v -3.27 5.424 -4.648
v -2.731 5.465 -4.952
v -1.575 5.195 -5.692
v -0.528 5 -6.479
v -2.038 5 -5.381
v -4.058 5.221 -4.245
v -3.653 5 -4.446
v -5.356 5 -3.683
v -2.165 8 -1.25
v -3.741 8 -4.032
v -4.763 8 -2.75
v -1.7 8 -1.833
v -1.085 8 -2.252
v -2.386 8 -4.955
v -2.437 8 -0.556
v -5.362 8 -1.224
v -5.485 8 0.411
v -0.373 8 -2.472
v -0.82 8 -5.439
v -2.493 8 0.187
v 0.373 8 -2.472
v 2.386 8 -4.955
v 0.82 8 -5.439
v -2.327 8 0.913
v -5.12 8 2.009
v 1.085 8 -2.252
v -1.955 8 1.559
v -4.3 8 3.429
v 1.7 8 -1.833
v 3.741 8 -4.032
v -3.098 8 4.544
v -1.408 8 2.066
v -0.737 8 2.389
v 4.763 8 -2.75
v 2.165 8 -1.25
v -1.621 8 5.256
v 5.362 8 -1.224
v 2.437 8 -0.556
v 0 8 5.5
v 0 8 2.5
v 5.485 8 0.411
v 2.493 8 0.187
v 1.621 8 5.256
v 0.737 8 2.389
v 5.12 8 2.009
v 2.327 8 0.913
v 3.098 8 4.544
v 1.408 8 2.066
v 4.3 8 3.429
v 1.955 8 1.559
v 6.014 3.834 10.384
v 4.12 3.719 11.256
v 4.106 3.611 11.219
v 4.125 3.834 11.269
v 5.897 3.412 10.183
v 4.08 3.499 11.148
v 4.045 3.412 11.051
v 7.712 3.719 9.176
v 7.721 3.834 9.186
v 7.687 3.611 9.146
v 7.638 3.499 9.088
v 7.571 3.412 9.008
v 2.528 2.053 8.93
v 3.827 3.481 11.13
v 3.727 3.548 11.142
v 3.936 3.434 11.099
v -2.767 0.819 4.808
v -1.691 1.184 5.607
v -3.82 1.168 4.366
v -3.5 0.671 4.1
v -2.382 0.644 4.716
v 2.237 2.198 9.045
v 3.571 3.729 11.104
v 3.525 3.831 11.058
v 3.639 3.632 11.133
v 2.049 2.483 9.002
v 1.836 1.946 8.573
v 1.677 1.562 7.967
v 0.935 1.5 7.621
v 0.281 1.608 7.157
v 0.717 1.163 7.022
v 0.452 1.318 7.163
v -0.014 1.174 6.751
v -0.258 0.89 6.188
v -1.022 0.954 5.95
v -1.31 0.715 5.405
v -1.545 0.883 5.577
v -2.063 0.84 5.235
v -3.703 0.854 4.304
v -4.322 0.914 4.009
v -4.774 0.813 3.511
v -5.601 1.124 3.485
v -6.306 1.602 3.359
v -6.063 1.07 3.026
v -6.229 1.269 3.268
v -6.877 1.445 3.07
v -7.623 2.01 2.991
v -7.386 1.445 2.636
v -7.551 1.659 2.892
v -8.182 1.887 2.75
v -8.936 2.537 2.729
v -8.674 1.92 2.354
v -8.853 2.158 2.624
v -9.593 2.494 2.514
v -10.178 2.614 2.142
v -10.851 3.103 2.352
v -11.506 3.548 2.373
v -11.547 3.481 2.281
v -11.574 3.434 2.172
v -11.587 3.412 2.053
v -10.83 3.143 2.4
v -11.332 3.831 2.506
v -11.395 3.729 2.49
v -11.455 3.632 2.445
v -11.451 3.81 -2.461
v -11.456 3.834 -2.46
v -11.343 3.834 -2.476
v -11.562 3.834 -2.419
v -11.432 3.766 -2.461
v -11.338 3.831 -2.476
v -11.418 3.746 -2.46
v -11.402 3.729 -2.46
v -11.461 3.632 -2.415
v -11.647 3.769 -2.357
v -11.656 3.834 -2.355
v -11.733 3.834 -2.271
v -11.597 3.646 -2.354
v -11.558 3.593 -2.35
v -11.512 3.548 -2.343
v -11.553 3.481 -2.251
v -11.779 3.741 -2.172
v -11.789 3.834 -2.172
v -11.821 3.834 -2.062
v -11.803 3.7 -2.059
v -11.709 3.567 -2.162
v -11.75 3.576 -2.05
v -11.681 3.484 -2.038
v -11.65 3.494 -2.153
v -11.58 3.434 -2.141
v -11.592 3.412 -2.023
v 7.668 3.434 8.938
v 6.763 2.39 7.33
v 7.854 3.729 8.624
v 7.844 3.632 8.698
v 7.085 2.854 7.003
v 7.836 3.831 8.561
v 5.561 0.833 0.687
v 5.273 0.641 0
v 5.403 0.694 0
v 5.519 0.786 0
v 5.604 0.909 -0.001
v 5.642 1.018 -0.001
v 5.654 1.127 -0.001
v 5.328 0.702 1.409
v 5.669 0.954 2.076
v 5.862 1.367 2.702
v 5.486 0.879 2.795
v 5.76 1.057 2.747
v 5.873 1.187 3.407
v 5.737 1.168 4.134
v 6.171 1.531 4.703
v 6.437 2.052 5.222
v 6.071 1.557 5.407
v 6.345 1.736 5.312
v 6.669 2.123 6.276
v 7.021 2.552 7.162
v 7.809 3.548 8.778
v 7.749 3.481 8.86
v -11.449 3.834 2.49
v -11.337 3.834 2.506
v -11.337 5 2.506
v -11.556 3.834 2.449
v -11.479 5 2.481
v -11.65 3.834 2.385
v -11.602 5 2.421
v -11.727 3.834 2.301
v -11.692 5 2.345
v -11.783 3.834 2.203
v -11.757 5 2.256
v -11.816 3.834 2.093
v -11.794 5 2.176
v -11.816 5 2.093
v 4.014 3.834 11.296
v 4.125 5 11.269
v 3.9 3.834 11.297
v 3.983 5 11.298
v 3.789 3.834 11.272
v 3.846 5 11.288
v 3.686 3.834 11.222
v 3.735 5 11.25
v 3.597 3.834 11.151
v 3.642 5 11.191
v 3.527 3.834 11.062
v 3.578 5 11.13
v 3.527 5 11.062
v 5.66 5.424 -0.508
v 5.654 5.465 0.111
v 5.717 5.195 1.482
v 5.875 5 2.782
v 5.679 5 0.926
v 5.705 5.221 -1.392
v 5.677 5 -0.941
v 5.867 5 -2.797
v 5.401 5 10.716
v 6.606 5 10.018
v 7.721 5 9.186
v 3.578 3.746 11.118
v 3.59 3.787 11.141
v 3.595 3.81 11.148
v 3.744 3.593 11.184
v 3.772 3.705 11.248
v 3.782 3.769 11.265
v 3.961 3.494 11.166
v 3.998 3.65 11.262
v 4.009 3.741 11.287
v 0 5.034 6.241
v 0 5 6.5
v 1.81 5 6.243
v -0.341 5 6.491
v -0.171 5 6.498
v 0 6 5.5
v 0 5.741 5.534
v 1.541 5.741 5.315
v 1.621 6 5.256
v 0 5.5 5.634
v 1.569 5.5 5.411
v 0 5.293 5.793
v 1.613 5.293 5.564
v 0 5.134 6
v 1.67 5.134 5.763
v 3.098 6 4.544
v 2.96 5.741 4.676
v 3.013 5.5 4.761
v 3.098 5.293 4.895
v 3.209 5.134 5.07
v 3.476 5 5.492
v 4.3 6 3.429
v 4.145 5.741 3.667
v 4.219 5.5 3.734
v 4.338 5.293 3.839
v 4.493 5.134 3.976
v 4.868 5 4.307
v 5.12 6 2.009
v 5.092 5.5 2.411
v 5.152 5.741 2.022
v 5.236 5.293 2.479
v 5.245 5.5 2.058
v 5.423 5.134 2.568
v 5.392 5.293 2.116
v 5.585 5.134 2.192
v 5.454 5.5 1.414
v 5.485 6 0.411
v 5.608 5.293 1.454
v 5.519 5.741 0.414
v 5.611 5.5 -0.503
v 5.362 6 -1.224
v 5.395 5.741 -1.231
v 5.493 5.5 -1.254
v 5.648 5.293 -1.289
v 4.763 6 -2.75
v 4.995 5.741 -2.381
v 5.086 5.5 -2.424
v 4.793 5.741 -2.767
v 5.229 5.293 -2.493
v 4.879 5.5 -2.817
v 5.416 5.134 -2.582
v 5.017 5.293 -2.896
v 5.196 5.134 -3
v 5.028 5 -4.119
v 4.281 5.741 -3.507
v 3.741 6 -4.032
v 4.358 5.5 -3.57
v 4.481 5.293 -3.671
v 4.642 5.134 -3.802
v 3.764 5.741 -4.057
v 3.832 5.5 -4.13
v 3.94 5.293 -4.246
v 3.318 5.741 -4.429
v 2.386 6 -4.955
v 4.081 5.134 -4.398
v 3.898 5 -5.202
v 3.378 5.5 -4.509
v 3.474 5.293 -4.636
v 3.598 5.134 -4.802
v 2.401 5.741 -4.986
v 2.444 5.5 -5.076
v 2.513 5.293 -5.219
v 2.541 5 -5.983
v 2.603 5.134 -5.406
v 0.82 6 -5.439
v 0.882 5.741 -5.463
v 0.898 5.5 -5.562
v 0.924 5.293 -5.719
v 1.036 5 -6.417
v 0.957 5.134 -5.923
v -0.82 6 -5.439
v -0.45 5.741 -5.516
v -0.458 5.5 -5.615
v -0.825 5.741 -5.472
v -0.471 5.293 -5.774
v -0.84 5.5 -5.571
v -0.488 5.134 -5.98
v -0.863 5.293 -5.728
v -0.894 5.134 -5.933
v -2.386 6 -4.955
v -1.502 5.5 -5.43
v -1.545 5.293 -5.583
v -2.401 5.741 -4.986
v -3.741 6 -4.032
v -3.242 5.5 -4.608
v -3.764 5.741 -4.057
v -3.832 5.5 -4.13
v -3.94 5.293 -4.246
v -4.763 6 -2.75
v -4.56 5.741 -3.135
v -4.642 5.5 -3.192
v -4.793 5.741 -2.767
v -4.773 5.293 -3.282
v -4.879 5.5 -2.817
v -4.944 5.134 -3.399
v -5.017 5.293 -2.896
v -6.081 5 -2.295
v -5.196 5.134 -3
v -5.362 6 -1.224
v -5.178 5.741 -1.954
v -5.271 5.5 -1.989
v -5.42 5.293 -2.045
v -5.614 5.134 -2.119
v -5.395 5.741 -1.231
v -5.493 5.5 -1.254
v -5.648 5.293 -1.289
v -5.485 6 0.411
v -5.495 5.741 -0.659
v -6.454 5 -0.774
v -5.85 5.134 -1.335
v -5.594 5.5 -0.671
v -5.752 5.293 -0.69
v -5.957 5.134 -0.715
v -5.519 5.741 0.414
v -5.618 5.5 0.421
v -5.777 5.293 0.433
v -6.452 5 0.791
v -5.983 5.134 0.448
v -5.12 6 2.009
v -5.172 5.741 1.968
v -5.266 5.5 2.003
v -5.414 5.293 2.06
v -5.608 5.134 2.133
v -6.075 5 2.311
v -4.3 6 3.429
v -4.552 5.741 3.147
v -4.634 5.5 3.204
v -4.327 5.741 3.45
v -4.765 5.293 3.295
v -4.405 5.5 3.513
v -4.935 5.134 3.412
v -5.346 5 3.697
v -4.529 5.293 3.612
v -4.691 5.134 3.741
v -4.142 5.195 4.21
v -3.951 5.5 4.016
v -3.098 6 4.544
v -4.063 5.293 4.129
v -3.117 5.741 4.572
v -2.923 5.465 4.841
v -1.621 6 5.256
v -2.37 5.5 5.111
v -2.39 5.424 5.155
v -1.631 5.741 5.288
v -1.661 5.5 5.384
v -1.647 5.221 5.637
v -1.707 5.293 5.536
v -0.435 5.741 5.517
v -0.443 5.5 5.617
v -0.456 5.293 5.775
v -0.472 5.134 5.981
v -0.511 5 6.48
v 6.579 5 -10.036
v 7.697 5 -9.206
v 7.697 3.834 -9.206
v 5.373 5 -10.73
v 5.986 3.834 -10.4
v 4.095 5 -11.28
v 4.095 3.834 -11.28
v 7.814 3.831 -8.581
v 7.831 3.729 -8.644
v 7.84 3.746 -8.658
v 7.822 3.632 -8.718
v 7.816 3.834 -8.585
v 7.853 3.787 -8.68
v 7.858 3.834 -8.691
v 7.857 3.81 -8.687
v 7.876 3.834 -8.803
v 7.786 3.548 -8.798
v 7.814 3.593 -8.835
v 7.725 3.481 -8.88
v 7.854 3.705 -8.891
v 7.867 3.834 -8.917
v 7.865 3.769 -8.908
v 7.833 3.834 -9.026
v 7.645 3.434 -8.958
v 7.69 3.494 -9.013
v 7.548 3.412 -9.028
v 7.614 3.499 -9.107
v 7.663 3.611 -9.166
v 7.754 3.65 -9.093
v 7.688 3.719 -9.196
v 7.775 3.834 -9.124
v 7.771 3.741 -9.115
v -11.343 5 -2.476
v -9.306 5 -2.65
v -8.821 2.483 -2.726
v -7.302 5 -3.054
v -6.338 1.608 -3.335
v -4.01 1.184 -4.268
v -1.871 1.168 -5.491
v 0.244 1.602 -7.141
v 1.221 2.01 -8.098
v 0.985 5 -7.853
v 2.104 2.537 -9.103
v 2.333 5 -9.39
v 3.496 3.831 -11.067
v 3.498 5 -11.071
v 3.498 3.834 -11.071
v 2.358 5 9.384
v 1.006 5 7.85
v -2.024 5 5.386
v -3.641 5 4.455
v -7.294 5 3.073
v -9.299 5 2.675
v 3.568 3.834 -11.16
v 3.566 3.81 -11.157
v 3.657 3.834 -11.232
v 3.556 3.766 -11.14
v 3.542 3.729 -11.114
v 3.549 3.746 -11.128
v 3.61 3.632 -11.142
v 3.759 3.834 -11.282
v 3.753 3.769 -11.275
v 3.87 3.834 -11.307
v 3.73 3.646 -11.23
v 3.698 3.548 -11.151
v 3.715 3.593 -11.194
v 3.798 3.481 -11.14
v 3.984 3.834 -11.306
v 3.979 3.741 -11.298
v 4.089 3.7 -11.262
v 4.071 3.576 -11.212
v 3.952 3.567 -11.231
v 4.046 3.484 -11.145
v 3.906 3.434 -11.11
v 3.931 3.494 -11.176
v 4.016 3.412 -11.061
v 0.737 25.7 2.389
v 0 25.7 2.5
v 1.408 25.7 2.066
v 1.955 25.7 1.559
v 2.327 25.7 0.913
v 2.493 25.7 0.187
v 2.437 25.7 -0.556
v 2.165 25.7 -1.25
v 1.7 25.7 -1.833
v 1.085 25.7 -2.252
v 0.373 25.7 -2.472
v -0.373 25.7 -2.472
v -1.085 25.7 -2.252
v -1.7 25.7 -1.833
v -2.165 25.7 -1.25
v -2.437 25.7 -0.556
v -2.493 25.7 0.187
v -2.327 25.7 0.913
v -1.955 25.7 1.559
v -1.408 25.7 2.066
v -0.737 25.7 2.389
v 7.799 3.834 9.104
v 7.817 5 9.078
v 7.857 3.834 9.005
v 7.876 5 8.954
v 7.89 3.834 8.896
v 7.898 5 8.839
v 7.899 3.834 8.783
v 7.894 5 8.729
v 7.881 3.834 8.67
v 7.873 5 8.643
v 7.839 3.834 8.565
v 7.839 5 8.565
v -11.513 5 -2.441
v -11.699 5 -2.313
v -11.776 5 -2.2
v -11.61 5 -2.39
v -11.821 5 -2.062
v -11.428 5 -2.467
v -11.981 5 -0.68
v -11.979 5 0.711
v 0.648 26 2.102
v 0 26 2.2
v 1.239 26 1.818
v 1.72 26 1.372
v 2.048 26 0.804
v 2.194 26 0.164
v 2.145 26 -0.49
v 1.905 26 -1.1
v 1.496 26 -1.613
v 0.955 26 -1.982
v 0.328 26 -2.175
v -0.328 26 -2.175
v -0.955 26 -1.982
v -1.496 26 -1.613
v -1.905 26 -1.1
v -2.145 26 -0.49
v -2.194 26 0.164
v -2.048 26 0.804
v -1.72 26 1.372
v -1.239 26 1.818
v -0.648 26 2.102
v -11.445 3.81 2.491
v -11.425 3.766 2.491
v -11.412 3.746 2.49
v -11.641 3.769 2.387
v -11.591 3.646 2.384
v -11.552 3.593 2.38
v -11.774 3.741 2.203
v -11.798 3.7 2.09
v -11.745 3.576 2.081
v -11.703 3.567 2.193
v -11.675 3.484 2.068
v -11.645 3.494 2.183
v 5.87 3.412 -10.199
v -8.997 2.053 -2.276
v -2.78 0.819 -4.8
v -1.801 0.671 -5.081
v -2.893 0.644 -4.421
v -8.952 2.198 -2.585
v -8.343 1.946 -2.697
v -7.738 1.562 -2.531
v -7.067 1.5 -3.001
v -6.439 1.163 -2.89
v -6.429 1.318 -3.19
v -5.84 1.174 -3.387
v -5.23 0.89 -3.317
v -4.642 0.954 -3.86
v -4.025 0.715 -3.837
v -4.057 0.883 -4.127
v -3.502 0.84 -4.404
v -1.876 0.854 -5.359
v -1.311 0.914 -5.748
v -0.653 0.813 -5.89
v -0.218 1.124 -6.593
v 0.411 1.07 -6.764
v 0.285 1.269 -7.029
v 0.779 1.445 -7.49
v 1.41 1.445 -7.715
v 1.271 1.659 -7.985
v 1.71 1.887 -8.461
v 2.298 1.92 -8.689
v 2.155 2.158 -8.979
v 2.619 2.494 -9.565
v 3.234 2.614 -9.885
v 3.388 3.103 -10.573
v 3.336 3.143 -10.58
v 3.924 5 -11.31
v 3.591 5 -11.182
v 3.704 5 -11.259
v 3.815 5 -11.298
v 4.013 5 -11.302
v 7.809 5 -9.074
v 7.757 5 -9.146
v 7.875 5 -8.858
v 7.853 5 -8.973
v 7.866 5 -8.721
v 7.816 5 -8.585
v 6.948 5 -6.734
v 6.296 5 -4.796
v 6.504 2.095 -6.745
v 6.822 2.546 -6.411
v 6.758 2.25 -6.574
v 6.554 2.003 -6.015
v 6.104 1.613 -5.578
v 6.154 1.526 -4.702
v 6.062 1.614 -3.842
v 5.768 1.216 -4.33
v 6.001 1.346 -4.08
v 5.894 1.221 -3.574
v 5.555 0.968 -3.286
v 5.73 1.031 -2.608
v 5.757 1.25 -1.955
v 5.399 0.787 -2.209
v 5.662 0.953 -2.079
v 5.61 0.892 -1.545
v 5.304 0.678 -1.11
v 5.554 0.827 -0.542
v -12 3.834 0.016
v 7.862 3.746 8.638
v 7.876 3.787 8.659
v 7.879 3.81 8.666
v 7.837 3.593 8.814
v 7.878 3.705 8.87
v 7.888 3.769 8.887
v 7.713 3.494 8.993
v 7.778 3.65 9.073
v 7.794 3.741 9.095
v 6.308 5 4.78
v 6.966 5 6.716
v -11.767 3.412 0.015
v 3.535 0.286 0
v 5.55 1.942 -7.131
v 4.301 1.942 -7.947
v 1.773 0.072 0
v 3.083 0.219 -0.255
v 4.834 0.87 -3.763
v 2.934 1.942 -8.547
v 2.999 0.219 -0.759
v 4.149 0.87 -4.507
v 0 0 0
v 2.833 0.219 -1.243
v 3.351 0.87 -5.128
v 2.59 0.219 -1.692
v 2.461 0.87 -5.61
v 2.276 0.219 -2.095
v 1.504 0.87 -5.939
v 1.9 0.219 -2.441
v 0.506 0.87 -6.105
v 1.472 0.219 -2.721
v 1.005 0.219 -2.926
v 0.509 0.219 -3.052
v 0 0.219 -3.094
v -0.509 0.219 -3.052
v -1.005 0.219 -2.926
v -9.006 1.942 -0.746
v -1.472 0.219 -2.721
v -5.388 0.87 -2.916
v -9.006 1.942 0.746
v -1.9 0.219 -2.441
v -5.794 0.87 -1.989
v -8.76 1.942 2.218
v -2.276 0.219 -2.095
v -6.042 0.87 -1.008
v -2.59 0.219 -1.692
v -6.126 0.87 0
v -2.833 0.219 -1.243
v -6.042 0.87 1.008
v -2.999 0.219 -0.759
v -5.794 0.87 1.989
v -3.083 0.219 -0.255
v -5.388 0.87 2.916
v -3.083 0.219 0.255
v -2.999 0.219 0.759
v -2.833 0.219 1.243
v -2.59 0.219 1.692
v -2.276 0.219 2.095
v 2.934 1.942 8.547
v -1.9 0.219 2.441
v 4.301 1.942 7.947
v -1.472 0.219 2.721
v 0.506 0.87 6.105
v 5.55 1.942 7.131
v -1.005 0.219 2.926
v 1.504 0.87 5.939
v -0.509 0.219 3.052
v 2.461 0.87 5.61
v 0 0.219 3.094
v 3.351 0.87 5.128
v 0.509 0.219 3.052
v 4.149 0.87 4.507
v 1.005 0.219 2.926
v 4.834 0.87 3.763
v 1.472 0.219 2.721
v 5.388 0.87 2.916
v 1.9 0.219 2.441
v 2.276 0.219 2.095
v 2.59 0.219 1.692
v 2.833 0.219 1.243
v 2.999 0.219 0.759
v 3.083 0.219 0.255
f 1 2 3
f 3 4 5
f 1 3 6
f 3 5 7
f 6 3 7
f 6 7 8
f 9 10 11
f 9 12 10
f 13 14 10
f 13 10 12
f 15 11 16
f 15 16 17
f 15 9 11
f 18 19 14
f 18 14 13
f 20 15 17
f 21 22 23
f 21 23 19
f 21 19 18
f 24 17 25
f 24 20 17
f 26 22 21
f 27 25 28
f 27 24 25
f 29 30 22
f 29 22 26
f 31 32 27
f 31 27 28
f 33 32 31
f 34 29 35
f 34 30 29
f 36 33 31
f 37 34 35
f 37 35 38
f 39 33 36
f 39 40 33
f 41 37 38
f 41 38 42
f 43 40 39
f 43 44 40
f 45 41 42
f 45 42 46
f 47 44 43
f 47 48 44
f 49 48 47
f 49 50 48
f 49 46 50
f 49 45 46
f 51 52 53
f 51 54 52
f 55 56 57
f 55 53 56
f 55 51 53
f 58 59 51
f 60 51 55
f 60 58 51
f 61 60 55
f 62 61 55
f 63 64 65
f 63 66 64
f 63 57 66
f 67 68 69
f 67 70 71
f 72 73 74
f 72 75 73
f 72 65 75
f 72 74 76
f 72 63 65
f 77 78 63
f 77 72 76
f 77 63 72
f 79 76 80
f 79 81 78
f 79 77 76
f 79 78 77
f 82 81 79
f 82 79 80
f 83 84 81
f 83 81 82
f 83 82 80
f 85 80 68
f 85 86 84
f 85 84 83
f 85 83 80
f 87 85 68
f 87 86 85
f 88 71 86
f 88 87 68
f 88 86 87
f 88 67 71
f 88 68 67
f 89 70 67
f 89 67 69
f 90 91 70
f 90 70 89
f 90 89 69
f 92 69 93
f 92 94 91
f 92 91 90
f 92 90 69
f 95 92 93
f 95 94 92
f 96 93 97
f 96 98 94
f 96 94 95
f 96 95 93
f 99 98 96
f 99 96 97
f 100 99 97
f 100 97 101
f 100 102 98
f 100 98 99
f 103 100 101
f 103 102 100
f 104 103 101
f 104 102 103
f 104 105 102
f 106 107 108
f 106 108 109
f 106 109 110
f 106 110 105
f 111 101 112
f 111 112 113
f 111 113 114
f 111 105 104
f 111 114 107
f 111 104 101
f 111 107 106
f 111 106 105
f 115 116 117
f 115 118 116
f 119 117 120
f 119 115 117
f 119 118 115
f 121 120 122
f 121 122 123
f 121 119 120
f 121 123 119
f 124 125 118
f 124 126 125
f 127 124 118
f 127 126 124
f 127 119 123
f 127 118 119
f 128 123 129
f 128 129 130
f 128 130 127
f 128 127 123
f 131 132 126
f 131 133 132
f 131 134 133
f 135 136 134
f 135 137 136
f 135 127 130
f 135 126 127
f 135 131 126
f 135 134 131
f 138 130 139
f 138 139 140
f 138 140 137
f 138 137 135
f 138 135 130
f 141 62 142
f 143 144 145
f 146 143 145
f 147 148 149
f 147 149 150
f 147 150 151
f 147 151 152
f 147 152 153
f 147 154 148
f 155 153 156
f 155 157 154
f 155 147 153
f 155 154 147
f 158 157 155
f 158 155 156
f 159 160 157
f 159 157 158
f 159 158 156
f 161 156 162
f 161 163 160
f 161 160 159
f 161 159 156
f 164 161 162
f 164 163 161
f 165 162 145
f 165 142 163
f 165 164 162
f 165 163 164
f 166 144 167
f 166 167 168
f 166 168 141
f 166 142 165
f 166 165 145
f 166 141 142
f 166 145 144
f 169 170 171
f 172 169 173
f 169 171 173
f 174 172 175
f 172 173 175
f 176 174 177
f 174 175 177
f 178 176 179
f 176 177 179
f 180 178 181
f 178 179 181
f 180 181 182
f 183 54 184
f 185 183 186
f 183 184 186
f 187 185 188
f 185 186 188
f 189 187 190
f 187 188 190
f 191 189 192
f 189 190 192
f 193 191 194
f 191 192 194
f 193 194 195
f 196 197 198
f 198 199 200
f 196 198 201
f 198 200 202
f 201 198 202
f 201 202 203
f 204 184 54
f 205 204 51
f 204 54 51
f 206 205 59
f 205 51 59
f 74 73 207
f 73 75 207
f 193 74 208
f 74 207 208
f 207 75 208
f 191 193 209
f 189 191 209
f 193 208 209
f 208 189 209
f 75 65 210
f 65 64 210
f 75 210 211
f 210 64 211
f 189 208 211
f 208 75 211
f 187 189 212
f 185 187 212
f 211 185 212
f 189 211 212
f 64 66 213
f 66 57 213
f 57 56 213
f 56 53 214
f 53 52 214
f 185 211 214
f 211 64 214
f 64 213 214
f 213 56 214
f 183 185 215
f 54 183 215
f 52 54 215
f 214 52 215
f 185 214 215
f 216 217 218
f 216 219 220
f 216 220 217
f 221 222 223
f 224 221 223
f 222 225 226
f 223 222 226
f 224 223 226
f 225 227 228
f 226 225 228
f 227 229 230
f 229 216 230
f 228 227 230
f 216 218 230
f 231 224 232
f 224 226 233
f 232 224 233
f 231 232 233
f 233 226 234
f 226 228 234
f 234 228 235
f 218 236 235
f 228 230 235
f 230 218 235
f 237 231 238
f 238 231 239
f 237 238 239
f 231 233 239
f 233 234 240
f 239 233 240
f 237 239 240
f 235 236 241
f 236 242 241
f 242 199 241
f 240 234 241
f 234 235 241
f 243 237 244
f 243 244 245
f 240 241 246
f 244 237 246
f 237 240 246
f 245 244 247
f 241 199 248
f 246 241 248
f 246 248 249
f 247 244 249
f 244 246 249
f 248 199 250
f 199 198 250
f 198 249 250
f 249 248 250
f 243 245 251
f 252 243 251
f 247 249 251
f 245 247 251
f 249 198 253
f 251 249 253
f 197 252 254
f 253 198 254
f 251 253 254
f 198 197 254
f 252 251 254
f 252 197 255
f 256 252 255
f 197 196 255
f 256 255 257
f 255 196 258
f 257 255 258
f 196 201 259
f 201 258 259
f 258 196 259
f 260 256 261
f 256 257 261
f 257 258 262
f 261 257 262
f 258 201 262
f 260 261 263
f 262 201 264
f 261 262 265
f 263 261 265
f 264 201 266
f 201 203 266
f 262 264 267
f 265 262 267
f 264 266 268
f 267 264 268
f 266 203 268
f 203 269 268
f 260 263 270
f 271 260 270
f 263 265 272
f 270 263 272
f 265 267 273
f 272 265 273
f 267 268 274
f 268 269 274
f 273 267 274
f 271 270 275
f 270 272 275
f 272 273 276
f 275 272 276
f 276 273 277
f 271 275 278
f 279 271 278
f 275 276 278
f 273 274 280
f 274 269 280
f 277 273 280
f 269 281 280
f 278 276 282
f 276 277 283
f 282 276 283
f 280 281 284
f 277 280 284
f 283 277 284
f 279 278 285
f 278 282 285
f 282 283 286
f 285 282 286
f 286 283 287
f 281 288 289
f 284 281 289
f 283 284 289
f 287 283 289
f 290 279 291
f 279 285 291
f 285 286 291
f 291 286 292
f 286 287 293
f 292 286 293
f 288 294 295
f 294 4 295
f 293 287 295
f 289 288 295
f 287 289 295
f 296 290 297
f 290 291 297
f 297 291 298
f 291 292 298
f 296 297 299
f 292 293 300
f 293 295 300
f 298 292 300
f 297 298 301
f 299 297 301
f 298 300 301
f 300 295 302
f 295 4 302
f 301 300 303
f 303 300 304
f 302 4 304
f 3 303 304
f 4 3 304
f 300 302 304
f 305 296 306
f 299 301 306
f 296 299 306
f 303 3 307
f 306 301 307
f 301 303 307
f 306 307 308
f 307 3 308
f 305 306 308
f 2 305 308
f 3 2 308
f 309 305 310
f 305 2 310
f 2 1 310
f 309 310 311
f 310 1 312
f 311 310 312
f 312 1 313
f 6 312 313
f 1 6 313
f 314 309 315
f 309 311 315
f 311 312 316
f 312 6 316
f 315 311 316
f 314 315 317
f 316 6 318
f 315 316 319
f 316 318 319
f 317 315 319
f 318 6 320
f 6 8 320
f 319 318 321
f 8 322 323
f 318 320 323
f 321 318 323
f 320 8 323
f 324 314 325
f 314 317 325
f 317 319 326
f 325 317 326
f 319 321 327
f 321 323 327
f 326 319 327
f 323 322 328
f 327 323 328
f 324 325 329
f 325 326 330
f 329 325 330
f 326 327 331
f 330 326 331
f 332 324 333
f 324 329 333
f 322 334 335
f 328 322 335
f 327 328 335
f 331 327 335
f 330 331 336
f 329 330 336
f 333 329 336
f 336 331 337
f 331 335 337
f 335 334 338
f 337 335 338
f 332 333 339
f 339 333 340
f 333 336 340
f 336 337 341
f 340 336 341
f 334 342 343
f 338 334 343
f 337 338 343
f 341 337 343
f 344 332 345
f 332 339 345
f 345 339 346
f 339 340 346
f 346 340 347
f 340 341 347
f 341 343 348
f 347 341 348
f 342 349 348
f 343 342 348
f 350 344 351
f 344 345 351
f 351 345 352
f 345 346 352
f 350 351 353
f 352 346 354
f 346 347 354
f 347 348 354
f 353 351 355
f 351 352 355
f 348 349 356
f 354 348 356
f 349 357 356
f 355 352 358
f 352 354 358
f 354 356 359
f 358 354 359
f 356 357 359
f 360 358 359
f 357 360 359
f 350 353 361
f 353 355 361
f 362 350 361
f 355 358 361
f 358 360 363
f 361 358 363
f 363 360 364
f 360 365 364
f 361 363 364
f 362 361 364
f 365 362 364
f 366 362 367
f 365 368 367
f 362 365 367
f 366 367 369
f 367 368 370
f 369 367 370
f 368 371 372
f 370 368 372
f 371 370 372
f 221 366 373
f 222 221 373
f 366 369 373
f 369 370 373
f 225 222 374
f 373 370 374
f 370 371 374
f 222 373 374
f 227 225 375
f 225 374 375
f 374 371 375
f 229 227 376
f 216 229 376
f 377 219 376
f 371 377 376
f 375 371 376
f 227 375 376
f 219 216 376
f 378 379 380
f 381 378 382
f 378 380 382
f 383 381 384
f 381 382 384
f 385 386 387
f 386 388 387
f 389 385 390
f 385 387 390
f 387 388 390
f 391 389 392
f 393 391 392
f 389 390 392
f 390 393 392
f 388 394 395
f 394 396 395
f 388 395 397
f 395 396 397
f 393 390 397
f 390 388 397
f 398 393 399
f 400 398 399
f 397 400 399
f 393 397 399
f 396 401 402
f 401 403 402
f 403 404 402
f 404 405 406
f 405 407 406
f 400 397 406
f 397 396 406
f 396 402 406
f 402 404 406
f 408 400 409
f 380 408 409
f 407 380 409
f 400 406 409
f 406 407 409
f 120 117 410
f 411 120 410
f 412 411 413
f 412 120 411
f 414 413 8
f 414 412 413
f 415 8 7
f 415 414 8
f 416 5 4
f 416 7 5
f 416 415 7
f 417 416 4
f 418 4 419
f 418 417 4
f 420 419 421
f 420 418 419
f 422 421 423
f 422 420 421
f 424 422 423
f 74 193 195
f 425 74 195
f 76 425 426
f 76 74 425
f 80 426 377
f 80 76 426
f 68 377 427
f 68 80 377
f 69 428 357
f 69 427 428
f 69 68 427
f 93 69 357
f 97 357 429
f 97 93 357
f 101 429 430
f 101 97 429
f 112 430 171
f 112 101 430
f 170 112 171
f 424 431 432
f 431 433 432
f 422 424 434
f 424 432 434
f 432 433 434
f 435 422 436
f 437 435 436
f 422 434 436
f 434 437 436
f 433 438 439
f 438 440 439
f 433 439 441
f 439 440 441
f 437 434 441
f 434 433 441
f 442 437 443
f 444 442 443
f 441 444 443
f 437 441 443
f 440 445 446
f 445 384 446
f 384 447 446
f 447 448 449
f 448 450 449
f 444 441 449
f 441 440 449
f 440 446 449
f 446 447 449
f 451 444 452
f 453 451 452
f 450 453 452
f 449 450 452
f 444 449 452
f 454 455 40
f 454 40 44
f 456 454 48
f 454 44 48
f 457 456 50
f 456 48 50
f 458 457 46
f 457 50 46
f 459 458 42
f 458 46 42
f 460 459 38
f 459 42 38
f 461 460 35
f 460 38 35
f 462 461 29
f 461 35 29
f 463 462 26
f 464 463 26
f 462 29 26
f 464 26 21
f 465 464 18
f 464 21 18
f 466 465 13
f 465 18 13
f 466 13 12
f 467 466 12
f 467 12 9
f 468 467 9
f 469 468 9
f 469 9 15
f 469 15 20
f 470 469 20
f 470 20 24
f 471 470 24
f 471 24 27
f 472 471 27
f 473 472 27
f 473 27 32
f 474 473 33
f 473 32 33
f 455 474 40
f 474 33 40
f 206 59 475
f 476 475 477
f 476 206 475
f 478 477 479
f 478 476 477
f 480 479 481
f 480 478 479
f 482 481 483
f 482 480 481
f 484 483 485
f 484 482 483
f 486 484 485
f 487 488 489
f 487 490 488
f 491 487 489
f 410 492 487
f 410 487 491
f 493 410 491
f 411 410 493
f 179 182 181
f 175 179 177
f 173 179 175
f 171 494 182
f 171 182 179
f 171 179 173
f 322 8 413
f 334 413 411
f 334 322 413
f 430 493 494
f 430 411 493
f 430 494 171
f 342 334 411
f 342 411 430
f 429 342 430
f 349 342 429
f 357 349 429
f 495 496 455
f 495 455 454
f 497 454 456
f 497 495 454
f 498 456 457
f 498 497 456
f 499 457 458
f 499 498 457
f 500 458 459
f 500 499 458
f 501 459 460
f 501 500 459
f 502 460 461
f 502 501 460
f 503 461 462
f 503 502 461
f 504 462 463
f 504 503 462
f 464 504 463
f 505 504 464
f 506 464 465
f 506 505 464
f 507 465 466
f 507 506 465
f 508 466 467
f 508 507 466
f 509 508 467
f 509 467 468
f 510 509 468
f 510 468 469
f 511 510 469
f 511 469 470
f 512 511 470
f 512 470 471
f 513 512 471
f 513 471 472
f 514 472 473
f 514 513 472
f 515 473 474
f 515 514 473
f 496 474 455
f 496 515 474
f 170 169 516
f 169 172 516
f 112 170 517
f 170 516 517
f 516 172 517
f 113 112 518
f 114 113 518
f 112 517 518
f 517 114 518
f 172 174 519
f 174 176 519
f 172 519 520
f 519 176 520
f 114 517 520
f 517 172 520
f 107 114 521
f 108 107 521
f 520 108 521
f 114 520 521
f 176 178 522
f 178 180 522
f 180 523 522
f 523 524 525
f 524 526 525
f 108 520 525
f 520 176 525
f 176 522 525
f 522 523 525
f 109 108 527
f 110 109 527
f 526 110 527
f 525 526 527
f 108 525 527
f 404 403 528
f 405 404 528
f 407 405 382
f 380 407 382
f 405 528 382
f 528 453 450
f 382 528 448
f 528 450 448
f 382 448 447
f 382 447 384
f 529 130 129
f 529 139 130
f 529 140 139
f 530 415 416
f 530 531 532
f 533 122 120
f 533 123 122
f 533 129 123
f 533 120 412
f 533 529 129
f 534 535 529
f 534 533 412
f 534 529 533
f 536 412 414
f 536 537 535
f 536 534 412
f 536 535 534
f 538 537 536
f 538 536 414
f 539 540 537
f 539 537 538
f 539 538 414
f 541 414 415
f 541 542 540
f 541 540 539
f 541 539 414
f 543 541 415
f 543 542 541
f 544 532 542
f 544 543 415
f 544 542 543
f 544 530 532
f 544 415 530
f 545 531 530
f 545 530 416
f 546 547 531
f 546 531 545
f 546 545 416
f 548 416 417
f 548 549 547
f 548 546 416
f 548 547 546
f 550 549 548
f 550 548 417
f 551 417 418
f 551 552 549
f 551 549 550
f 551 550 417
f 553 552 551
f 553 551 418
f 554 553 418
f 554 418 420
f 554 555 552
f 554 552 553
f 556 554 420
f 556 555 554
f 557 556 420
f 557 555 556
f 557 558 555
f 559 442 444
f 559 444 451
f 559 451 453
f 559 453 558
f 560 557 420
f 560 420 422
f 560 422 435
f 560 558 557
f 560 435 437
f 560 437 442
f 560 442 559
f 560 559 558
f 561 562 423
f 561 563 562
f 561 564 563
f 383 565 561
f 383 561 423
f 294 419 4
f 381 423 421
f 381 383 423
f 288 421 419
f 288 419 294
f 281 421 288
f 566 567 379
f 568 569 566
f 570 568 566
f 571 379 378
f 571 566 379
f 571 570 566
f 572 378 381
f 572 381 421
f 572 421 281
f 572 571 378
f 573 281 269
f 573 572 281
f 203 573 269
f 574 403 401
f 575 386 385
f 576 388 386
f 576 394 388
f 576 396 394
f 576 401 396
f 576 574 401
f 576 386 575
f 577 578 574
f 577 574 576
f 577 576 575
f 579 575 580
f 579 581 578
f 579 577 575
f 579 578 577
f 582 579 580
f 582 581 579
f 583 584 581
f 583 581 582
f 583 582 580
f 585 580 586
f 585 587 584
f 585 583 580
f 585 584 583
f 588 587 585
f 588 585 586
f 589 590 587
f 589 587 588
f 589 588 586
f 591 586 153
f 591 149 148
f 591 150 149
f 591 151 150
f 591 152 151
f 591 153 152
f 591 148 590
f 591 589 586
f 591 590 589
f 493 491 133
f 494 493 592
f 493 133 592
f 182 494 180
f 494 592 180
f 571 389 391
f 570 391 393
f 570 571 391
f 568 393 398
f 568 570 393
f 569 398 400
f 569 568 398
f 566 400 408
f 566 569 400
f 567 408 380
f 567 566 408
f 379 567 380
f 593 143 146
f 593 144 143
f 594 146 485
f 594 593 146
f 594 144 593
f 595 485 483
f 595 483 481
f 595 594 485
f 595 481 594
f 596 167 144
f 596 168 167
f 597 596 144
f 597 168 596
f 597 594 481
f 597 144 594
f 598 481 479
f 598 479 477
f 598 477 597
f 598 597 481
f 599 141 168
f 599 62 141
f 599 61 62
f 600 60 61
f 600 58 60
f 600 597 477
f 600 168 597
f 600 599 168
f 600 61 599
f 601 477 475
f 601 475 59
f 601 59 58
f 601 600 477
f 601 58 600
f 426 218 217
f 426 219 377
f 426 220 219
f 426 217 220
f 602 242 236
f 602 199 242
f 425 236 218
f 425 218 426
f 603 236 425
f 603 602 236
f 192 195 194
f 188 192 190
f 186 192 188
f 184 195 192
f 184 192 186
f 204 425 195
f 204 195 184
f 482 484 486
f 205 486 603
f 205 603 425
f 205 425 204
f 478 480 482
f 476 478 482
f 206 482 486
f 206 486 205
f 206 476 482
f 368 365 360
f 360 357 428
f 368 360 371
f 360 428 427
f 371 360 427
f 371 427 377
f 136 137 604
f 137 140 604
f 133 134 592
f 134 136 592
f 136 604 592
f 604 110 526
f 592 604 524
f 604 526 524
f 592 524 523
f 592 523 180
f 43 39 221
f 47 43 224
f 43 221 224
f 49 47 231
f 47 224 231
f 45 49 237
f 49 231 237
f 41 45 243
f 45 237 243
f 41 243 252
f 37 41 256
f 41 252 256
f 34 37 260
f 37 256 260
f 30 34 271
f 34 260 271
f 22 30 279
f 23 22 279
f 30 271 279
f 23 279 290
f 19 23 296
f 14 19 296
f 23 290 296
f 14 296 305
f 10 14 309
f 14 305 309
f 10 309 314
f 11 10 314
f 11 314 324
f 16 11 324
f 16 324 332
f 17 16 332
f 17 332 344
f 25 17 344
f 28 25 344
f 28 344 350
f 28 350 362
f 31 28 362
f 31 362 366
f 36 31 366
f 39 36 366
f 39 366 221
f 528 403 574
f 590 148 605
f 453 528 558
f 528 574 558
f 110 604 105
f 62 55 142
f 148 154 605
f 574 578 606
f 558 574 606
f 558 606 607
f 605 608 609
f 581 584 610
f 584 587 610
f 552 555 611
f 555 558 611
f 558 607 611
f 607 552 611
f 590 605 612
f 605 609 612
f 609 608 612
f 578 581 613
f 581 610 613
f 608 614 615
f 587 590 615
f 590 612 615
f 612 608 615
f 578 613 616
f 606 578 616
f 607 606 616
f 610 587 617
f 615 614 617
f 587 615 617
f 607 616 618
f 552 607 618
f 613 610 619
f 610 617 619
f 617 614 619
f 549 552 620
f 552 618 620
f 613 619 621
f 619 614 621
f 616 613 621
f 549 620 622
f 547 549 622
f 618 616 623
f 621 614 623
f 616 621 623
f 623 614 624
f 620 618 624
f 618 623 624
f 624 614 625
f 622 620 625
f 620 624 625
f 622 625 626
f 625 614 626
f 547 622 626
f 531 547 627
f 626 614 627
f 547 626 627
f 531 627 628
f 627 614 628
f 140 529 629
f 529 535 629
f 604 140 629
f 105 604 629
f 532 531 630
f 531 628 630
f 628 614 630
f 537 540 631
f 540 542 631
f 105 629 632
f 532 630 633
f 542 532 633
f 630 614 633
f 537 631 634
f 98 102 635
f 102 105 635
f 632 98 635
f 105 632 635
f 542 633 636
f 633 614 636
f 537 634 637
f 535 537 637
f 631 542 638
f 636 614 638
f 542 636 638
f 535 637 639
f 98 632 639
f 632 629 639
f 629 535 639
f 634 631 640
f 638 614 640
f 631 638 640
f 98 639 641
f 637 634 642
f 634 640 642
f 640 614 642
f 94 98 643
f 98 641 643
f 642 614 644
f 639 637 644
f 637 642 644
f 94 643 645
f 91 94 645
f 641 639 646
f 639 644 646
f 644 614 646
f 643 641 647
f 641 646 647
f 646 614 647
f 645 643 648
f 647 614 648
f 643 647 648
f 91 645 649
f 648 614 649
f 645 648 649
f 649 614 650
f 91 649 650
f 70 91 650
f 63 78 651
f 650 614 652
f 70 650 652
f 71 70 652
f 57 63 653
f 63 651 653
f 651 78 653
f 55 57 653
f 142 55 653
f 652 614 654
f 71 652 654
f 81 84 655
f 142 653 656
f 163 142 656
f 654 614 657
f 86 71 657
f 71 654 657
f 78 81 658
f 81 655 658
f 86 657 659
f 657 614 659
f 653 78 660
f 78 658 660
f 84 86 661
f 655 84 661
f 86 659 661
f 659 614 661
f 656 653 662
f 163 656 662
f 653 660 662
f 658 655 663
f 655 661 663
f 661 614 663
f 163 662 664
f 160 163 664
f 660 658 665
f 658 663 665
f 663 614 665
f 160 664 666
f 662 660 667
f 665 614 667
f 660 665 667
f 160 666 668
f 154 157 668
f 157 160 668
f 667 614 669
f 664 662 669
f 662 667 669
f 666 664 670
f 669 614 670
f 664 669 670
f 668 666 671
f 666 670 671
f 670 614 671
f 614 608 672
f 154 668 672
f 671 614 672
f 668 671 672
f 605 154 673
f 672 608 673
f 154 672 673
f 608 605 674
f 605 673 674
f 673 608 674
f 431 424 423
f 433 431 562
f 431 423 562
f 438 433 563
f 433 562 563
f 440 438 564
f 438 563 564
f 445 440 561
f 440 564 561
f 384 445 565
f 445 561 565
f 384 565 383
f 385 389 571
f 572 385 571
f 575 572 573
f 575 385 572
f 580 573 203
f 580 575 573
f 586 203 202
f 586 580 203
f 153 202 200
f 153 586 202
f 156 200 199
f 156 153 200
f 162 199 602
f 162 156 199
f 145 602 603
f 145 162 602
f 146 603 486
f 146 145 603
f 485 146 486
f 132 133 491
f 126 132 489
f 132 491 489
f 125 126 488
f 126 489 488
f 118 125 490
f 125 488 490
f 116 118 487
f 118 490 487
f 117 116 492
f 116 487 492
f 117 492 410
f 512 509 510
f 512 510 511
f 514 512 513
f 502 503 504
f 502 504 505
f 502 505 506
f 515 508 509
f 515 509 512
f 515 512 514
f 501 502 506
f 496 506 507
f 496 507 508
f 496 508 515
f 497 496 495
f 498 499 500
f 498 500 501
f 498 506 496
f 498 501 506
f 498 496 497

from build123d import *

# Parameters (mm, degrees)
SZKIC1_R                    = 12
DODANIE_WYCI_GNI_CIE1_DEPTH = 5
WYTNIJ_WYCI_GNI_CIE1_START  = -5
WYTNIJ_WYCI_GNI_CIE1_DEPTH  = 5
SZYK_KO_OWY1_COUNT          = 3
ZAOKR_GLENIE1_R             = 0.5
SZKIC4_R                    = 5.5
DODANIE_WYCI_GNI_CIE2_DEPTH = 3
SZKIC5_R                    = 2.5
DODANIE_WYCI_GNI_CIE3_DEPTH = 18
ZAOKR_GLENIE2_R             = 1
SFAZOWANIE1_SIZE            = 0.3


with BuildPart() as part:
    # Szkic1 → Dodanie-wyciągnięcie1 (new body)
    with BuildSketch(Plane(origin=(0, 0, 0), x_dir=(1, 0, 0), z_dir=(0, 1, 0))):
        with Locations(Location((0, 0, 0), (0, 0, 270))):
            Circle(SZKIC1_R)
    extrude(amount=DODANIE_WYCI_GNI_CIE1_DEPTH)

    # Szkic2 → Wytnij-wyciągnięcie1 (cut)
    with BuildSketch(Plane(origin=(0, 5, 0), x_dir=(1, 0, 0), z_dir=(0, 1, 0)).offset(WYTNIJ_WYCI_GNI_CIE1_START)):
        with BuildLine():
            ThreePointArc((-11.736670864, -2.500111405), (-5.986418703, -10.400134187), (3.732985364, -11.404596454))
            ThreePointArc((3.732985364, -11.404596454), (-2.820371946, -4.899798719), (-11.736670864, -2.500111405))
        make_face()
    wytnij_wyci_gni_cie1 = extrude(amount=WYTNIJ_WYCI_GNI_CIE1_DEPTH, mode=Mode.SUBTRACT)

    # Szyk kołowy1: Wytnij-wyciągnięcie1 ×3 about axis
    szyk_ko_owy1_axis = Axis((0, 0, 0), (0, 1, 0))
    for i in range(1, SZYK_KO_OWY1_COUNT):
        add(wytnij_wyci_gni_cie1.rotate(szyk_ko_owy1_axis, i * 360 / SZYK_KO_OWY1_COUNT), mode=Mode.SUBTRACT)

    # Szkic3 → Wycięcie-obrót2 (revolve, cut)
    with BuildSketch(Plane.XY, mode=Mode.PRIVATE) as wyci_cie_obr_t2_sk:
        with BuildLine():
            Line((0, 0), (0, -1))
            Line((0, -1), (-12, -1))
            Line((-12, -1), (-12, 3.560911085))
            ThreePointArc((-12, 3.560911085), (-6.258595844, 0.909007182), (0, 0))
        make_face()
    revolve(wyci_cie_obr_t2_sk.sketch.rotate(Axis((0, -5.338346039, 0), (0, 1, 0)), 180), axis=Axis((0, -5.338346039, 0), (0, 1, 0)), mode=Mode.SUBTRACT)

    # Zaokrąglenie1
    zaokr_glenie1_edges = [part.edges().sort_by_distance(p)[0] for p in [
        (3.703175443, 4.280455543, -11.414310826),
        (-11.743162931, 4.280455543, -2.469438069),
        (-2.833164191, 0.738827064, -4.892413113),
        (8.033495421, 4.280455543, 8.914199421),
        (8.010177567, 4.280455543, -8.935158384),
        (-11.736670864, 4.280455543, 2.500111405),
        (3.732985364, 4.280455543, 11.404596454),
        (6.013571057, 3.560911085, 10.384457768),
        (5.986418703, 3.560911085, -10.400134187),
        (-2.820371946, 0.738827064, 4.899798719),
        (6.315413129, 1.481143646, 4.805423076),
        (-11.99998976, 3.560911085, 0.015676419),
    ]]
    fillet(zaokr_glenie1_edges, radius=ZAOKR_GLENIE1_R)

    # Szkic4 → Dodanie-wyciągnięcie2 (add)
    with BuildSketch(Plane(origin=(0, 5, 0), x_dir=(1, 0, 0), z_dir=(0, 1, 0))):
        with Locations(Location((0, 0, 0), (0, 0, 270))):
            Circle(SZKIC4_R)
    extrude(amount=DODANIE_WYCI_GNI_CIE2_DEPTH)

    # Szkic5 → Dodanie-wyciągnięcie3 (add)
    with BuildSketch(Plane(origin=(0, 8, 0), x_dir=(1, 0, 0), z_dir=(0, 1, 0))):
        with Locations(Location((0, 0, 0), (0, 0, 270))):
            Circle(SZKIC5_R)
    extrude(amount=DODANIE_WYCI_GNI_CIE3_DEPTH)

    # Zaokrąglenie2
    # the kernel refuses this fillet: 1 mm, written as the material it adds along each edge
    with BuildSketch(Plane(origin=(0, 5, 0), x_dir=(0, 0, 1), z_dir=(-1, 0, 0))) as zaokr_glenie2_piece_1_section:
        with BuildLine():
            CenterArc((5.5 + ZAOKR_GLENIE2_R, ZAOKR_GLENIE2_R), ZAOKR_GLENIE2_R, 180, 90)
            Line((5.5, ZAOKR_GLENIE2_R), (5.5, 0))
            Line((5.5, 0), (5.5 + ZAOKR_GLENIE2_R, 0))
        make_face()
    zaokr_glenie2_piece_1 = revolve(axis=Axis((0, 5, 0), (0, 1, 0)), mode=Mode.PRIVATE)
    zaokr_glenie2_piece_1 = zaokr_glenie2_piece_1 - Plane(origin=(-11.8, 5.278674407, 20.5), x_dir=(0.8629436313514112, 0, -0.5053001970215725), z_dir=(0, -1, 0)) * Cylinder(18, 26, mode=Mode.PRIVATE)
    zaokr_glenie2_piece_1 = zaokr_glenie2_piece_1 - Plane(origin=(23.653520778, 5.278674407, -0.030900235), x_dir=(-0.8690746228336692, 0, -0.49468100827352957), z_dir=(0, -1, 0)) * Cylinder(18, 26, mode=Mode.PRIVATE)
    zaokr_glenie2_piece_1 = zaokr_glenie2_piece_1 - Plane(origin=(-11.853520778, 5.278674407, -20.469099765), x_dir=(0.006130991482257597, 0, 0.9999812052951018), z_dir=(0, -1, 0)) * Cylinder(18, 26, mode=Mode.PRIVATE)
    add(zaokr_glenie2_piece_1)

    # Sfazowanie1
    sfazowanie1_edges = [part.edges().sort_by_distance(p)[0] for p in [
        (0, 26, -2.5),
    ]]
    chamfer(sfazowanie1_edges, length=SFAZOWANIE1_SIZE)


solid = part.part
